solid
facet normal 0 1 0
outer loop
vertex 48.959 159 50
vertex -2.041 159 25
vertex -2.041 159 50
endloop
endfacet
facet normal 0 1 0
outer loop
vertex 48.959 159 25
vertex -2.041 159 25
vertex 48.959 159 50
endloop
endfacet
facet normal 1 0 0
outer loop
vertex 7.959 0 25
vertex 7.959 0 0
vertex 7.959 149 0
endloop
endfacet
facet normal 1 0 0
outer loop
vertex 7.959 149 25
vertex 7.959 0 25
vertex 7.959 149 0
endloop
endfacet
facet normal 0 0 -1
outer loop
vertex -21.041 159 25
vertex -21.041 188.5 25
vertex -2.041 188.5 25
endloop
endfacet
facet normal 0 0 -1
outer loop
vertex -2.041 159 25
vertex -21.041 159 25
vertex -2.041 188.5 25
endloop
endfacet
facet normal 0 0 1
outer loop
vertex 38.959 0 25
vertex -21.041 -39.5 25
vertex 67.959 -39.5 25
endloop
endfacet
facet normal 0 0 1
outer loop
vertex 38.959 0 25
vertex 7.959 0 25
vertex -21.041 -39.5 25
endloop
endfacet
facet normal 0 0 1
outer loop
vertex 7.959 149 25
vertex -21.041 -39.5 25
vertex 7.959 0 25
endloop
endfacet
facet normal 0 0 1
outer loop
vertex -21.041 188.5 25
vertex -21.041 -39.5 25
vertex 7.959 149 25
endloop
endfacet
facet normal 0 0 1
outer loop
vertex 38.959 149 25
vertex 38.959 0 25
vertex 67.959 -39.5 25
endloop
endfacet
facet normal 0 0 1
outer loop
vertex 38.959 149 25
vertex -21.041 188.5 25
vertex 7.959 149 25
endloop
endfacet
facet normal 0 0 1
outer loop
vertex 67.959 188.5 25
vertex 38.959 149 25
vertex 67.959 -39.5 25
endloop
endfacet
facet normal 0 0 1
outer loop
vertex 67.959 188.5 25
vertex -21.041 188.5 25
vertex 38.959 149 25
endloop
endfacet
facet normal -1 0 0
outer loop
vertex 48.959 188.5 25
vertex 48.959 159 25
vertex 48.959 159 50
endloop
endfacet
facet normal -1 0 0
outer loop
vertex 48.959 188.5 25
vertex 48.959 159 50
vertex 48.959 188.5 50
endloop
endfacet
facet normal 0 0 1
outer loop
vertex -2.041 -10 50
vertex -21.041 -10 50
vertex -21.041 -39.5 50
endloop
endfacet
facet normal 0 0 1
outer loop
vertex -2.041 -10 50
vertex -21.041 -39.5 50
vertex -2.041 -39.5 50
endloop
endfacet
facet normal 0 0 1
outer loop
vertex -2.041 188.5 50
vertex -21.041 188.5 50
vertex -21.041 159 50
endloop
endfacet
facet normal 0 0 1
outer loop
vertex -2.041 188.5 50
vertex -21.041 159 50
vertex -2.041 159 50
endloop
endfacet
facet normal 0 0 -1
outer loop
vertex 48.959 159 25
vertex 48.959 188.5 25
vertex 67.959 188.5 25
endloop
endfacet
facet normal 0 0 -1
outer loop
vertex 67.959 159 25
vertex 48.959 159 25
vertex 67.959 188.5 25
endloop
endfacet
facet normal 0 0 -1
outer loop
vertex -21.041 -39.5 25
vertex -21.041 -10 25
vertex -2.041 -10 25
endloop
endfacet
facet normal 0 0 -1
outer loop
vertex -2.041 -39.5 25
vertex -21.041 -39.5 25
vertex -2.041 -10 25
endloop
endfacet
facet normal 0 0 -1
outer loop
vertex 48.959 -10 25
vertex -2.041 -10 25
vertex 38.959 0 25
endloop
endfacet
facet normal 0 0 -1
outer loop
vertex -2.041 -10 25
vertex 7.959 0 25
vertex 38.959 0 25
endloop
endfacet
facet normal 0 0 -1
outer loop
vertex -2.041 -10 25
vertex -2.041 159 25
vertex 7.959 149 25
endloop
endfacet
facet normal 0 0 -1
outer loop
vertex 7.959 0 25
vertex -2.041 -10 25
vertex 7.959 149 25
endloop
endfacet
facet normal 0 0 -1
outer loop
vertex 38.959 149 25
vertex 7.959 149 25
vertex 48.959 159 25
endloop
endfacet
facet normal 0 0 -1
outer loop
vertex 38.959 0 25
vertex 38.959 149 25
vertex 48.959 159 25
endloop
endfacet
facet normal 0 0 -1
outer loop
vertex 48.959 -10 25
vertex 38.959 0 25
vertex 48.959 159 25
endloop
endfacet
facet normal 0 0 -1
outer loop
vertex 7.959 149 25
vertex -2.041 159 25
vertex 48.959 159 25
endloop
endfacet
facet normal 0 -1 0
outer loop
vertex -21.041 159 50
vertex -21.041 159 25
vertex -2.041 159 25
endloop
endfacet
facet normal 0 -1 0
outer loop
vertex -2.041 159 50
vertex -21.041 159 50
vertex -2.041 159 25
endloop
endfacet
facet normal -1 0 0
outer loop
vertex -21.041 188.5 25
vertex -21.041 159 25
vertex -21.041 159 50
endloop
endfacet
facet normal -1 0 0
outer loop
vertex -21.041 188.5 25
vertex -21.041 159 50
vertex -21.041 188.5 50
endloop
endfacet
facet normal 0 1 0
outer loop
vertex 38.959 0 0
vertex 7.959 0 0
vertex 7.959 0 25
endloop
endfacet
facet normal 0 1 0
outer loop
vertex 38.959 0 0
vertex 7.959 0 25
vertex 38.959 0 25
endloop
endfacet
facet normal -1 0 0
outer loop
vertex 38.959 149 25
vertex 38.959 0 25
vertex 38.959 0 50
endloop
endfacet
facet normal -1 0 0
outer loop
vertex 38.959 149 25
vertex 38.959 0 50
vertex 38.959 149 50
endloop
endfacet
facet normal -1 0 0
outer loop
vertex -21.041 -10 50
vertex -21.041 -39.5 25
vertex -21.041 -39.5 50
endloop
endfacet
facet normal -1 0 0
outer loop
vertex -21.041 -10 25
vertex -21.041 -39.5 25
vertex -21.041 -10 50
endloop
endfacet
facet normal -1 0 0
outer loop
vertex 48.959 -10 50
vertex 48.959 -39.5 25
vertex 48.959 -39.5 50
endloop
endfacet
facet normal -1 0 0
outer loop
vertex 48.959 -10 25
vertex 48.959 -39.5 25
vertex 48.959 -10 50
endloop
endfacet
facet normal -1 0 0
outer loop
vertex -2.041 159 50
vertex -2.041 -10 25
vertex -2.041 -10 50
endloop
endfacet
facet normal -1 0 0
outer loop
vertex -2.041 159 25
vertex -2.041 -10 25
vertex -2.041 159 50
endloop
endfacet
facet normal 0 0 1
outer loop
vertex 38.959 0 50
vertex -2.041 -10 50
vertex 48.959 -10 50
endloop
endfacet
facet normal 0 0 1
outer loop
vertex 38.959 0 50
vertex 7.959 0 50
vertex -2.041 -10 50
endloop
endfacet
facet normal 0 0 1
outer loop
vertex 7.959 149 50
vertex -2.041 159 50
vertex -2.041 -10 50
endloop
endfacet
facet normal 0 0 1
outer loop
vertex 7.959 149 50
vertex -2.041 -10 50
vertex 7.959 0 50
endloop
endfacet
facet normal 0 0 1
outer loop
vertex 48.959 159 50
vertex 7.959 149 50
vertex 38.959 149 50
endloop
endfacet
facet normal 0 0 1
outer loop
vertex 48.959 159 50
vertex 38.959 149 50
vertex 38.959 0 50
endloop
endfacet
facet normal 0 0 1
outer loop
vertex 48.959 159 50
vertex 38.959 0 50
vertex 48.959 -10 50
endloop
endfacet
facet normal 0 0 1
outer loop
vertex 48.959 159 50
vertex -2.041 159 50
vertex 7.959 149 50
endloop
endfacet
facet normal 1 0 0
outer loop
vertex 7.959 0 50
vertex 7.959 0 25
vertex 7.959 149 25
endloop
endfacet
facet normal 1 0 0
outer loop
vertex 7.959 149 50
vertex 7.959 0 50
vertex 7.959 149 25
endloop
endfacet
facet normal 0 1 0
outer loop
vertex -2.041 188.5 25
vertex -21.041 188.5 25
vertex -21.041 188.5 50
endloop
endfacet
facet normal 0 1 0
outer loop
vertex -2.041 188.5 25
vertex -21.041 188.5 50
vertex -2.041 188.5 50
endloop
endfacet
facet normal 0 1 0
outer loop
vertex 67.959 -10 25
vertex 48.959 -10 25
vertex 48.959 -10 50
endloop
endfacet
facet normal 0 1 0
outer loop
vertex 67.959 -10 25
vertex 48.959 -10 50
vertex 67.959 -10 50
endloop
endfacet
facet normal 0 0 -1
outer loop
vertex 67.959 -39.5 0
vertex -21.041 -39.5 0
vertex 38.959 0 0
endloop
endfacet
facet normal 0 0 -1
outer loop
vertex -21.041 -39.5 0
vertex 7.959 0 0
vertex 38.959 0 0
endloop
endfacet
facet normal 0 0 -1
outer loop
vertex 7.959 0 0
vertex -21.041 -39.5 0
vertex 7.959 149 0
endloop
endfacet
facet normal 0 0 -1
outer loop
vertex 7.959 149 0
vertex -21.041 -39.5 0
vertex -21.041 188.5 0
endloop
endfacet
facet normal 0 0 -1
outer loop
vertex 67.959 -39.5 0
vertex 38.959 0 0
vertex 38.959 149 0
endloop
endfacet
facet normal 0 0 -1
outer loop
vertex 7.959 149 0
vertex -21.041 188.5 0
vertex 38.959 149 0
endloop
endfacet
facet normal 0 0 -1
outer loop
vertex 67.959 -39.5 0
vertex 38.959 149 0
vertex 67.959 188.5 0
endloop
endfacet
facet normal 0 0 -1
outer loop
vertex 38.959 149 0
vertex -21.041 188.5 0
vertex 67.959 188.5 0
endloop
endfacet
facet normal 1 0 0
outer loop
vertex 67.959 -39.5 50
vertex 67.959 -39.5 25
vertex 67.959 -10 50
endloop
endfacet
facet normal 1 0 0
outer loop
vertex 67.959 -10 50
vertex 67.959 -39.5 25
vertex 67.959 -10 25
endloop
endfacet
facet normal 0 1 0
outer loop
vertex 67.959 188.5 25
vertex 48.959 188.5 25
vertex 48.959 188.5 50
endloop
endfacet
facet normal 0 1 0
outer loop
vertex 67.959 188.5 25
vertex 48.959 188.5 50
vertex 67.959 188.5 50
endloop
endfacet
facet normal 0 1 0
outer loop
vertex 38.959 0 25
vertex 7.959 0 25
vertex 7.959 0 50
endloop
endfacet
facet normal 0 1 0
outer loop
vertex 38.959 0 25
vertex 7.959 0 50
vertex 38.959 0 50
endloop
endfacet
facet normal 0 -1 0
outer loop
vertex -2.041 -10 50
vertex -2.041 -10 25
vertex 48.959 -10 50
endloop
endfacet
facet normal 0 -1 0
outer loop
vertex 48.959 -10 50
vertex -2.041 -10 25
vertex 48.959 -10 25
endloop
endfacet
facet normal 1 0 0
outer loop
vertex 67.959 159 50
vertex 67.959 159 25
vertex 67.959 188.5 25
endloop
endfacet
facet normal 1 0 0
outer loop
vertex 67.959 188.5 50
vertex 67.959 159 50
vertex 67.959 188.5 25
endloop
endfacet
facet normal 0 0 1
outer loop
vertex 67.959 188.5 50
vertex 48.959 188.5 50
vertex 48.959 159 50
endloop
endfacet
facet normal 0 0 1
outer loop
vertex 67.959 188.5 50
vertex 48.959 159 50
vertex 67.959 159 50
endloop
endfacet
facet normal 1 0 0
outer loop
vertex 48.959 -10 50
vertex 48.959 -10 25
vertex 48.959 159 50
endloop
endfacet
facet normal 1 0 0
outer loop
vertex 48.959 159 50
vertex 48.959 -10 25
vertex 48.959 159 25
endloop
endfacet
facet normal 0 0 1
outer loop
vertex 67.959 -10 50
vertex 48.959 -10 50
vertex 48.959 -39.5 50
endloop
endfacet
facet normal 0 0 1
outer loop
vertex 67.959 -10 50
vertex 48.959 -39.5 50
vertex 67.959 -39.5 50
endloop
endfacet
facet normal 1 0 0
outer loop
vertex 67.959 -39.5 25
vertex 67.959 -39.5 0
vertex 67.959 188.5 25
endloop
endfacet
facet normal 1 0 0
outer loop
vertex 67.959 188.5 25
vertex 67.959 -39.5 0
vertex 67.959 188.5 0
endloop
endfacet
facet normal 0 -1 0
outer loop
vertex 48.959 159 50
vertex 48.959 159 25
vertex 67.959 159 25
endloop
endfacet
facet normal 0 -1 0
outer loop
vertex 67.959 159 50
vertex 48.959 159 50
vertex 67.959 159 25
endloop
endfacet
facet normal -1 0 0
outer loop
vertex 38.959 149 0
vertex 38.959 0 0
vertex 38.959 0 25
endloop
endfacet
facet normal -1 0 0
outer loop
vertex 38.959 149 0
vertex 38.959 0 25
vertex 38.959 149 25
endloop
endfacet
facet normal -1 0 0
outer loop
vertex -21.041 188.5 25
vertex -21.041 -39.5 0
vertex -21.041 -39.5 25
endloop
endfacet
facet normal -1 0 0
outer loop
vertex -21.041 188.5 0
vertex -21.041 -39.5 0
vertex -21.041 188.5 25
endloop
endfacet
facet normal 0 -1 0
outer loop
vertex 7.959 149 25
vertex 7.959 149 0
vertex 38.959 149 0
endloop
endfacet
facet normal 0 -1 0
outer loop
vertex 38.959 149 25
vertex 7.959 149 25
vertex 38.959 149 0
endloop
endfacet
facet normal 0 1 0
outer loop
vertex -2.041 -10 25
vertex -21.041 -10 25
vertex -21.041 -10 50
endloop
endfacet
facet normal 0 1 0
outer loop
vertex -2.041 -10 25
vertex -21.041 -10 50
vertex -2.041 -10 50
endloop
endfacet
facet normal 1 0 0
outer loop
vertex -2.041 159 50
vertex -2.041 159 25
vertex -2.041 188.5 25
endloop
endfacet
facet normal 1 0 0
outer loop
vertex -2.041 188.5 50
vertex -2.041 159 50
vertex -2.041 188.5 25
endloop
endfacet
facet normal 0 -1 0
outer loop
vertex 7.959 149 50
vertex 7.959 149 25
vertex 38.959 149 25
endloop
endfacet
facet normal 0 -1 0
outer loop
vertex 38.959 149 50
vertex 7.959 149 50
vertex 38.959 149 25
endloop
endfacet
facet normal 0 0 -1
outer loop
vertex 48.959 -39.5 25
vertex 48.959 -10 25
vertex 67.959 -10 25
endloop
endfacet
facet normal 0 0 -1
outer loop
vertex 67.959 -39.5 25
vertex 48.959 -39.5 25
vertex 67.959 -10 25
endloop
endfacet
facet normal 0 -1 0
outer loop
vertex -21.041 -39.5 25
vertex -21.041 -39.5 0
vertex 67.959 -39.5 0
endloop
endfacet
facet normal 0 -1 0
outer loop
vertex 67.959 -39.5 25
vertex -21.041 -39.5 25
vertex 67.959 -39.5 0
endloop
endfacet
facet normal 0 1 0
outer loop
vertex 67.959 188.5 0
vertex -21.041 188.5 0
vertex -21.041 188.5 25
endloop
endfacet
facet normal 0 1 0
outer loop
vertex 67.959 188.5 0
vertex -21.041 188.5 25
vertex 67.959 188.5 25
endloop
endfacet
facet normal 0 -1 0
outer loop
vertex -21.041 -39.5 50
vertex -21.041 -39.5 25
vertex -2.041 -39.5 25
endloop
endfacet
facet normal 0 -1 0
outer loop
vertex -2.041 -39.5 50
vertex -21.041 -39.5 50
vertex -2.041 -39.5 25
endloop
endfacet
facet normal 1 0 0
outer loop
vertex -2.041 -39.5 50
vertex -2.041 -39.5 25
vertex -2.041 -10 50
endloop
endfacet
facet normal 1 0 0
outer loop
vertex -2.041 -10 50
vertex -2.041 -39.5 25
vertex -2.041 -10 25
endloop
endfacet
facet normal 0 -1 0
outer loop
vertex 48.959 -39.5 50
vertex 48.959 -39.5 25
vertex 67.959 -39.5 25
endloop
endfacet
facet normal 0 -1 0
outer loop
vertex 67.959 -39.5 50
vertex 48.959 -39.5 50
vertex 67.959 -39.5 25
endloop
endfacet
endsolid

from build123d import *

# Parameters (mm, degrees)
F0_W     = 89
F0_H     = 228
F0_W_2   = 31
F0_H_2   = 149
F1_DEPTH = 25
F2_W     = 51
F2_H     = 169
F2_W_2   = 31
F2_H_2   = 149
F2_W_3   = 19
F2_H_3   = 29.5
F3_DEPTH = 25


with BuildPart() as f1:
    # F0 (on Top) → F1 (new body)
    with BuildSketch(Plane.XY):
        with Locations((23.458652, 74.5)):
            Rectangle(F0_W, F0_H)
        with Locations((23.458652, 74.5)):
            Rectangle(F0_W_2, F0_H_2, mode=Mode.SUBTRACT)
    extrude(amount=F1_DEPTH)


with BuildPart() as f3:
    # F2 (on face) → F3 (new body)
    with BuildSketch(Plane.XY.offset(25)):
        with Locations((23.458652, 74.5)):
            Rectangle(F2_W, F2_H)
        with Locations((23.458652, 74.5)):
            Rectangle(F2_W_2, F2_H_2, mode=Mode.SUBTRACT)
        with Locations((58.458652, 173.75)):
            Rectangle(F2_W_3, F2_H_3)
        with Locations((58.458652, -24.75)):
            Rectangle(F2_W_3, F2_H_3)
        with Locations((-11.541348, -24.75)):
            Rectangle(F2_W_3, F2_H_3)
        with Locations((-11.541348, 173.75)):
            Rectangle(F2_W_3, F2_H_3)
    extrude(amount=F3_DEPTH)


solid = Compound([f1.part, f3.part])
